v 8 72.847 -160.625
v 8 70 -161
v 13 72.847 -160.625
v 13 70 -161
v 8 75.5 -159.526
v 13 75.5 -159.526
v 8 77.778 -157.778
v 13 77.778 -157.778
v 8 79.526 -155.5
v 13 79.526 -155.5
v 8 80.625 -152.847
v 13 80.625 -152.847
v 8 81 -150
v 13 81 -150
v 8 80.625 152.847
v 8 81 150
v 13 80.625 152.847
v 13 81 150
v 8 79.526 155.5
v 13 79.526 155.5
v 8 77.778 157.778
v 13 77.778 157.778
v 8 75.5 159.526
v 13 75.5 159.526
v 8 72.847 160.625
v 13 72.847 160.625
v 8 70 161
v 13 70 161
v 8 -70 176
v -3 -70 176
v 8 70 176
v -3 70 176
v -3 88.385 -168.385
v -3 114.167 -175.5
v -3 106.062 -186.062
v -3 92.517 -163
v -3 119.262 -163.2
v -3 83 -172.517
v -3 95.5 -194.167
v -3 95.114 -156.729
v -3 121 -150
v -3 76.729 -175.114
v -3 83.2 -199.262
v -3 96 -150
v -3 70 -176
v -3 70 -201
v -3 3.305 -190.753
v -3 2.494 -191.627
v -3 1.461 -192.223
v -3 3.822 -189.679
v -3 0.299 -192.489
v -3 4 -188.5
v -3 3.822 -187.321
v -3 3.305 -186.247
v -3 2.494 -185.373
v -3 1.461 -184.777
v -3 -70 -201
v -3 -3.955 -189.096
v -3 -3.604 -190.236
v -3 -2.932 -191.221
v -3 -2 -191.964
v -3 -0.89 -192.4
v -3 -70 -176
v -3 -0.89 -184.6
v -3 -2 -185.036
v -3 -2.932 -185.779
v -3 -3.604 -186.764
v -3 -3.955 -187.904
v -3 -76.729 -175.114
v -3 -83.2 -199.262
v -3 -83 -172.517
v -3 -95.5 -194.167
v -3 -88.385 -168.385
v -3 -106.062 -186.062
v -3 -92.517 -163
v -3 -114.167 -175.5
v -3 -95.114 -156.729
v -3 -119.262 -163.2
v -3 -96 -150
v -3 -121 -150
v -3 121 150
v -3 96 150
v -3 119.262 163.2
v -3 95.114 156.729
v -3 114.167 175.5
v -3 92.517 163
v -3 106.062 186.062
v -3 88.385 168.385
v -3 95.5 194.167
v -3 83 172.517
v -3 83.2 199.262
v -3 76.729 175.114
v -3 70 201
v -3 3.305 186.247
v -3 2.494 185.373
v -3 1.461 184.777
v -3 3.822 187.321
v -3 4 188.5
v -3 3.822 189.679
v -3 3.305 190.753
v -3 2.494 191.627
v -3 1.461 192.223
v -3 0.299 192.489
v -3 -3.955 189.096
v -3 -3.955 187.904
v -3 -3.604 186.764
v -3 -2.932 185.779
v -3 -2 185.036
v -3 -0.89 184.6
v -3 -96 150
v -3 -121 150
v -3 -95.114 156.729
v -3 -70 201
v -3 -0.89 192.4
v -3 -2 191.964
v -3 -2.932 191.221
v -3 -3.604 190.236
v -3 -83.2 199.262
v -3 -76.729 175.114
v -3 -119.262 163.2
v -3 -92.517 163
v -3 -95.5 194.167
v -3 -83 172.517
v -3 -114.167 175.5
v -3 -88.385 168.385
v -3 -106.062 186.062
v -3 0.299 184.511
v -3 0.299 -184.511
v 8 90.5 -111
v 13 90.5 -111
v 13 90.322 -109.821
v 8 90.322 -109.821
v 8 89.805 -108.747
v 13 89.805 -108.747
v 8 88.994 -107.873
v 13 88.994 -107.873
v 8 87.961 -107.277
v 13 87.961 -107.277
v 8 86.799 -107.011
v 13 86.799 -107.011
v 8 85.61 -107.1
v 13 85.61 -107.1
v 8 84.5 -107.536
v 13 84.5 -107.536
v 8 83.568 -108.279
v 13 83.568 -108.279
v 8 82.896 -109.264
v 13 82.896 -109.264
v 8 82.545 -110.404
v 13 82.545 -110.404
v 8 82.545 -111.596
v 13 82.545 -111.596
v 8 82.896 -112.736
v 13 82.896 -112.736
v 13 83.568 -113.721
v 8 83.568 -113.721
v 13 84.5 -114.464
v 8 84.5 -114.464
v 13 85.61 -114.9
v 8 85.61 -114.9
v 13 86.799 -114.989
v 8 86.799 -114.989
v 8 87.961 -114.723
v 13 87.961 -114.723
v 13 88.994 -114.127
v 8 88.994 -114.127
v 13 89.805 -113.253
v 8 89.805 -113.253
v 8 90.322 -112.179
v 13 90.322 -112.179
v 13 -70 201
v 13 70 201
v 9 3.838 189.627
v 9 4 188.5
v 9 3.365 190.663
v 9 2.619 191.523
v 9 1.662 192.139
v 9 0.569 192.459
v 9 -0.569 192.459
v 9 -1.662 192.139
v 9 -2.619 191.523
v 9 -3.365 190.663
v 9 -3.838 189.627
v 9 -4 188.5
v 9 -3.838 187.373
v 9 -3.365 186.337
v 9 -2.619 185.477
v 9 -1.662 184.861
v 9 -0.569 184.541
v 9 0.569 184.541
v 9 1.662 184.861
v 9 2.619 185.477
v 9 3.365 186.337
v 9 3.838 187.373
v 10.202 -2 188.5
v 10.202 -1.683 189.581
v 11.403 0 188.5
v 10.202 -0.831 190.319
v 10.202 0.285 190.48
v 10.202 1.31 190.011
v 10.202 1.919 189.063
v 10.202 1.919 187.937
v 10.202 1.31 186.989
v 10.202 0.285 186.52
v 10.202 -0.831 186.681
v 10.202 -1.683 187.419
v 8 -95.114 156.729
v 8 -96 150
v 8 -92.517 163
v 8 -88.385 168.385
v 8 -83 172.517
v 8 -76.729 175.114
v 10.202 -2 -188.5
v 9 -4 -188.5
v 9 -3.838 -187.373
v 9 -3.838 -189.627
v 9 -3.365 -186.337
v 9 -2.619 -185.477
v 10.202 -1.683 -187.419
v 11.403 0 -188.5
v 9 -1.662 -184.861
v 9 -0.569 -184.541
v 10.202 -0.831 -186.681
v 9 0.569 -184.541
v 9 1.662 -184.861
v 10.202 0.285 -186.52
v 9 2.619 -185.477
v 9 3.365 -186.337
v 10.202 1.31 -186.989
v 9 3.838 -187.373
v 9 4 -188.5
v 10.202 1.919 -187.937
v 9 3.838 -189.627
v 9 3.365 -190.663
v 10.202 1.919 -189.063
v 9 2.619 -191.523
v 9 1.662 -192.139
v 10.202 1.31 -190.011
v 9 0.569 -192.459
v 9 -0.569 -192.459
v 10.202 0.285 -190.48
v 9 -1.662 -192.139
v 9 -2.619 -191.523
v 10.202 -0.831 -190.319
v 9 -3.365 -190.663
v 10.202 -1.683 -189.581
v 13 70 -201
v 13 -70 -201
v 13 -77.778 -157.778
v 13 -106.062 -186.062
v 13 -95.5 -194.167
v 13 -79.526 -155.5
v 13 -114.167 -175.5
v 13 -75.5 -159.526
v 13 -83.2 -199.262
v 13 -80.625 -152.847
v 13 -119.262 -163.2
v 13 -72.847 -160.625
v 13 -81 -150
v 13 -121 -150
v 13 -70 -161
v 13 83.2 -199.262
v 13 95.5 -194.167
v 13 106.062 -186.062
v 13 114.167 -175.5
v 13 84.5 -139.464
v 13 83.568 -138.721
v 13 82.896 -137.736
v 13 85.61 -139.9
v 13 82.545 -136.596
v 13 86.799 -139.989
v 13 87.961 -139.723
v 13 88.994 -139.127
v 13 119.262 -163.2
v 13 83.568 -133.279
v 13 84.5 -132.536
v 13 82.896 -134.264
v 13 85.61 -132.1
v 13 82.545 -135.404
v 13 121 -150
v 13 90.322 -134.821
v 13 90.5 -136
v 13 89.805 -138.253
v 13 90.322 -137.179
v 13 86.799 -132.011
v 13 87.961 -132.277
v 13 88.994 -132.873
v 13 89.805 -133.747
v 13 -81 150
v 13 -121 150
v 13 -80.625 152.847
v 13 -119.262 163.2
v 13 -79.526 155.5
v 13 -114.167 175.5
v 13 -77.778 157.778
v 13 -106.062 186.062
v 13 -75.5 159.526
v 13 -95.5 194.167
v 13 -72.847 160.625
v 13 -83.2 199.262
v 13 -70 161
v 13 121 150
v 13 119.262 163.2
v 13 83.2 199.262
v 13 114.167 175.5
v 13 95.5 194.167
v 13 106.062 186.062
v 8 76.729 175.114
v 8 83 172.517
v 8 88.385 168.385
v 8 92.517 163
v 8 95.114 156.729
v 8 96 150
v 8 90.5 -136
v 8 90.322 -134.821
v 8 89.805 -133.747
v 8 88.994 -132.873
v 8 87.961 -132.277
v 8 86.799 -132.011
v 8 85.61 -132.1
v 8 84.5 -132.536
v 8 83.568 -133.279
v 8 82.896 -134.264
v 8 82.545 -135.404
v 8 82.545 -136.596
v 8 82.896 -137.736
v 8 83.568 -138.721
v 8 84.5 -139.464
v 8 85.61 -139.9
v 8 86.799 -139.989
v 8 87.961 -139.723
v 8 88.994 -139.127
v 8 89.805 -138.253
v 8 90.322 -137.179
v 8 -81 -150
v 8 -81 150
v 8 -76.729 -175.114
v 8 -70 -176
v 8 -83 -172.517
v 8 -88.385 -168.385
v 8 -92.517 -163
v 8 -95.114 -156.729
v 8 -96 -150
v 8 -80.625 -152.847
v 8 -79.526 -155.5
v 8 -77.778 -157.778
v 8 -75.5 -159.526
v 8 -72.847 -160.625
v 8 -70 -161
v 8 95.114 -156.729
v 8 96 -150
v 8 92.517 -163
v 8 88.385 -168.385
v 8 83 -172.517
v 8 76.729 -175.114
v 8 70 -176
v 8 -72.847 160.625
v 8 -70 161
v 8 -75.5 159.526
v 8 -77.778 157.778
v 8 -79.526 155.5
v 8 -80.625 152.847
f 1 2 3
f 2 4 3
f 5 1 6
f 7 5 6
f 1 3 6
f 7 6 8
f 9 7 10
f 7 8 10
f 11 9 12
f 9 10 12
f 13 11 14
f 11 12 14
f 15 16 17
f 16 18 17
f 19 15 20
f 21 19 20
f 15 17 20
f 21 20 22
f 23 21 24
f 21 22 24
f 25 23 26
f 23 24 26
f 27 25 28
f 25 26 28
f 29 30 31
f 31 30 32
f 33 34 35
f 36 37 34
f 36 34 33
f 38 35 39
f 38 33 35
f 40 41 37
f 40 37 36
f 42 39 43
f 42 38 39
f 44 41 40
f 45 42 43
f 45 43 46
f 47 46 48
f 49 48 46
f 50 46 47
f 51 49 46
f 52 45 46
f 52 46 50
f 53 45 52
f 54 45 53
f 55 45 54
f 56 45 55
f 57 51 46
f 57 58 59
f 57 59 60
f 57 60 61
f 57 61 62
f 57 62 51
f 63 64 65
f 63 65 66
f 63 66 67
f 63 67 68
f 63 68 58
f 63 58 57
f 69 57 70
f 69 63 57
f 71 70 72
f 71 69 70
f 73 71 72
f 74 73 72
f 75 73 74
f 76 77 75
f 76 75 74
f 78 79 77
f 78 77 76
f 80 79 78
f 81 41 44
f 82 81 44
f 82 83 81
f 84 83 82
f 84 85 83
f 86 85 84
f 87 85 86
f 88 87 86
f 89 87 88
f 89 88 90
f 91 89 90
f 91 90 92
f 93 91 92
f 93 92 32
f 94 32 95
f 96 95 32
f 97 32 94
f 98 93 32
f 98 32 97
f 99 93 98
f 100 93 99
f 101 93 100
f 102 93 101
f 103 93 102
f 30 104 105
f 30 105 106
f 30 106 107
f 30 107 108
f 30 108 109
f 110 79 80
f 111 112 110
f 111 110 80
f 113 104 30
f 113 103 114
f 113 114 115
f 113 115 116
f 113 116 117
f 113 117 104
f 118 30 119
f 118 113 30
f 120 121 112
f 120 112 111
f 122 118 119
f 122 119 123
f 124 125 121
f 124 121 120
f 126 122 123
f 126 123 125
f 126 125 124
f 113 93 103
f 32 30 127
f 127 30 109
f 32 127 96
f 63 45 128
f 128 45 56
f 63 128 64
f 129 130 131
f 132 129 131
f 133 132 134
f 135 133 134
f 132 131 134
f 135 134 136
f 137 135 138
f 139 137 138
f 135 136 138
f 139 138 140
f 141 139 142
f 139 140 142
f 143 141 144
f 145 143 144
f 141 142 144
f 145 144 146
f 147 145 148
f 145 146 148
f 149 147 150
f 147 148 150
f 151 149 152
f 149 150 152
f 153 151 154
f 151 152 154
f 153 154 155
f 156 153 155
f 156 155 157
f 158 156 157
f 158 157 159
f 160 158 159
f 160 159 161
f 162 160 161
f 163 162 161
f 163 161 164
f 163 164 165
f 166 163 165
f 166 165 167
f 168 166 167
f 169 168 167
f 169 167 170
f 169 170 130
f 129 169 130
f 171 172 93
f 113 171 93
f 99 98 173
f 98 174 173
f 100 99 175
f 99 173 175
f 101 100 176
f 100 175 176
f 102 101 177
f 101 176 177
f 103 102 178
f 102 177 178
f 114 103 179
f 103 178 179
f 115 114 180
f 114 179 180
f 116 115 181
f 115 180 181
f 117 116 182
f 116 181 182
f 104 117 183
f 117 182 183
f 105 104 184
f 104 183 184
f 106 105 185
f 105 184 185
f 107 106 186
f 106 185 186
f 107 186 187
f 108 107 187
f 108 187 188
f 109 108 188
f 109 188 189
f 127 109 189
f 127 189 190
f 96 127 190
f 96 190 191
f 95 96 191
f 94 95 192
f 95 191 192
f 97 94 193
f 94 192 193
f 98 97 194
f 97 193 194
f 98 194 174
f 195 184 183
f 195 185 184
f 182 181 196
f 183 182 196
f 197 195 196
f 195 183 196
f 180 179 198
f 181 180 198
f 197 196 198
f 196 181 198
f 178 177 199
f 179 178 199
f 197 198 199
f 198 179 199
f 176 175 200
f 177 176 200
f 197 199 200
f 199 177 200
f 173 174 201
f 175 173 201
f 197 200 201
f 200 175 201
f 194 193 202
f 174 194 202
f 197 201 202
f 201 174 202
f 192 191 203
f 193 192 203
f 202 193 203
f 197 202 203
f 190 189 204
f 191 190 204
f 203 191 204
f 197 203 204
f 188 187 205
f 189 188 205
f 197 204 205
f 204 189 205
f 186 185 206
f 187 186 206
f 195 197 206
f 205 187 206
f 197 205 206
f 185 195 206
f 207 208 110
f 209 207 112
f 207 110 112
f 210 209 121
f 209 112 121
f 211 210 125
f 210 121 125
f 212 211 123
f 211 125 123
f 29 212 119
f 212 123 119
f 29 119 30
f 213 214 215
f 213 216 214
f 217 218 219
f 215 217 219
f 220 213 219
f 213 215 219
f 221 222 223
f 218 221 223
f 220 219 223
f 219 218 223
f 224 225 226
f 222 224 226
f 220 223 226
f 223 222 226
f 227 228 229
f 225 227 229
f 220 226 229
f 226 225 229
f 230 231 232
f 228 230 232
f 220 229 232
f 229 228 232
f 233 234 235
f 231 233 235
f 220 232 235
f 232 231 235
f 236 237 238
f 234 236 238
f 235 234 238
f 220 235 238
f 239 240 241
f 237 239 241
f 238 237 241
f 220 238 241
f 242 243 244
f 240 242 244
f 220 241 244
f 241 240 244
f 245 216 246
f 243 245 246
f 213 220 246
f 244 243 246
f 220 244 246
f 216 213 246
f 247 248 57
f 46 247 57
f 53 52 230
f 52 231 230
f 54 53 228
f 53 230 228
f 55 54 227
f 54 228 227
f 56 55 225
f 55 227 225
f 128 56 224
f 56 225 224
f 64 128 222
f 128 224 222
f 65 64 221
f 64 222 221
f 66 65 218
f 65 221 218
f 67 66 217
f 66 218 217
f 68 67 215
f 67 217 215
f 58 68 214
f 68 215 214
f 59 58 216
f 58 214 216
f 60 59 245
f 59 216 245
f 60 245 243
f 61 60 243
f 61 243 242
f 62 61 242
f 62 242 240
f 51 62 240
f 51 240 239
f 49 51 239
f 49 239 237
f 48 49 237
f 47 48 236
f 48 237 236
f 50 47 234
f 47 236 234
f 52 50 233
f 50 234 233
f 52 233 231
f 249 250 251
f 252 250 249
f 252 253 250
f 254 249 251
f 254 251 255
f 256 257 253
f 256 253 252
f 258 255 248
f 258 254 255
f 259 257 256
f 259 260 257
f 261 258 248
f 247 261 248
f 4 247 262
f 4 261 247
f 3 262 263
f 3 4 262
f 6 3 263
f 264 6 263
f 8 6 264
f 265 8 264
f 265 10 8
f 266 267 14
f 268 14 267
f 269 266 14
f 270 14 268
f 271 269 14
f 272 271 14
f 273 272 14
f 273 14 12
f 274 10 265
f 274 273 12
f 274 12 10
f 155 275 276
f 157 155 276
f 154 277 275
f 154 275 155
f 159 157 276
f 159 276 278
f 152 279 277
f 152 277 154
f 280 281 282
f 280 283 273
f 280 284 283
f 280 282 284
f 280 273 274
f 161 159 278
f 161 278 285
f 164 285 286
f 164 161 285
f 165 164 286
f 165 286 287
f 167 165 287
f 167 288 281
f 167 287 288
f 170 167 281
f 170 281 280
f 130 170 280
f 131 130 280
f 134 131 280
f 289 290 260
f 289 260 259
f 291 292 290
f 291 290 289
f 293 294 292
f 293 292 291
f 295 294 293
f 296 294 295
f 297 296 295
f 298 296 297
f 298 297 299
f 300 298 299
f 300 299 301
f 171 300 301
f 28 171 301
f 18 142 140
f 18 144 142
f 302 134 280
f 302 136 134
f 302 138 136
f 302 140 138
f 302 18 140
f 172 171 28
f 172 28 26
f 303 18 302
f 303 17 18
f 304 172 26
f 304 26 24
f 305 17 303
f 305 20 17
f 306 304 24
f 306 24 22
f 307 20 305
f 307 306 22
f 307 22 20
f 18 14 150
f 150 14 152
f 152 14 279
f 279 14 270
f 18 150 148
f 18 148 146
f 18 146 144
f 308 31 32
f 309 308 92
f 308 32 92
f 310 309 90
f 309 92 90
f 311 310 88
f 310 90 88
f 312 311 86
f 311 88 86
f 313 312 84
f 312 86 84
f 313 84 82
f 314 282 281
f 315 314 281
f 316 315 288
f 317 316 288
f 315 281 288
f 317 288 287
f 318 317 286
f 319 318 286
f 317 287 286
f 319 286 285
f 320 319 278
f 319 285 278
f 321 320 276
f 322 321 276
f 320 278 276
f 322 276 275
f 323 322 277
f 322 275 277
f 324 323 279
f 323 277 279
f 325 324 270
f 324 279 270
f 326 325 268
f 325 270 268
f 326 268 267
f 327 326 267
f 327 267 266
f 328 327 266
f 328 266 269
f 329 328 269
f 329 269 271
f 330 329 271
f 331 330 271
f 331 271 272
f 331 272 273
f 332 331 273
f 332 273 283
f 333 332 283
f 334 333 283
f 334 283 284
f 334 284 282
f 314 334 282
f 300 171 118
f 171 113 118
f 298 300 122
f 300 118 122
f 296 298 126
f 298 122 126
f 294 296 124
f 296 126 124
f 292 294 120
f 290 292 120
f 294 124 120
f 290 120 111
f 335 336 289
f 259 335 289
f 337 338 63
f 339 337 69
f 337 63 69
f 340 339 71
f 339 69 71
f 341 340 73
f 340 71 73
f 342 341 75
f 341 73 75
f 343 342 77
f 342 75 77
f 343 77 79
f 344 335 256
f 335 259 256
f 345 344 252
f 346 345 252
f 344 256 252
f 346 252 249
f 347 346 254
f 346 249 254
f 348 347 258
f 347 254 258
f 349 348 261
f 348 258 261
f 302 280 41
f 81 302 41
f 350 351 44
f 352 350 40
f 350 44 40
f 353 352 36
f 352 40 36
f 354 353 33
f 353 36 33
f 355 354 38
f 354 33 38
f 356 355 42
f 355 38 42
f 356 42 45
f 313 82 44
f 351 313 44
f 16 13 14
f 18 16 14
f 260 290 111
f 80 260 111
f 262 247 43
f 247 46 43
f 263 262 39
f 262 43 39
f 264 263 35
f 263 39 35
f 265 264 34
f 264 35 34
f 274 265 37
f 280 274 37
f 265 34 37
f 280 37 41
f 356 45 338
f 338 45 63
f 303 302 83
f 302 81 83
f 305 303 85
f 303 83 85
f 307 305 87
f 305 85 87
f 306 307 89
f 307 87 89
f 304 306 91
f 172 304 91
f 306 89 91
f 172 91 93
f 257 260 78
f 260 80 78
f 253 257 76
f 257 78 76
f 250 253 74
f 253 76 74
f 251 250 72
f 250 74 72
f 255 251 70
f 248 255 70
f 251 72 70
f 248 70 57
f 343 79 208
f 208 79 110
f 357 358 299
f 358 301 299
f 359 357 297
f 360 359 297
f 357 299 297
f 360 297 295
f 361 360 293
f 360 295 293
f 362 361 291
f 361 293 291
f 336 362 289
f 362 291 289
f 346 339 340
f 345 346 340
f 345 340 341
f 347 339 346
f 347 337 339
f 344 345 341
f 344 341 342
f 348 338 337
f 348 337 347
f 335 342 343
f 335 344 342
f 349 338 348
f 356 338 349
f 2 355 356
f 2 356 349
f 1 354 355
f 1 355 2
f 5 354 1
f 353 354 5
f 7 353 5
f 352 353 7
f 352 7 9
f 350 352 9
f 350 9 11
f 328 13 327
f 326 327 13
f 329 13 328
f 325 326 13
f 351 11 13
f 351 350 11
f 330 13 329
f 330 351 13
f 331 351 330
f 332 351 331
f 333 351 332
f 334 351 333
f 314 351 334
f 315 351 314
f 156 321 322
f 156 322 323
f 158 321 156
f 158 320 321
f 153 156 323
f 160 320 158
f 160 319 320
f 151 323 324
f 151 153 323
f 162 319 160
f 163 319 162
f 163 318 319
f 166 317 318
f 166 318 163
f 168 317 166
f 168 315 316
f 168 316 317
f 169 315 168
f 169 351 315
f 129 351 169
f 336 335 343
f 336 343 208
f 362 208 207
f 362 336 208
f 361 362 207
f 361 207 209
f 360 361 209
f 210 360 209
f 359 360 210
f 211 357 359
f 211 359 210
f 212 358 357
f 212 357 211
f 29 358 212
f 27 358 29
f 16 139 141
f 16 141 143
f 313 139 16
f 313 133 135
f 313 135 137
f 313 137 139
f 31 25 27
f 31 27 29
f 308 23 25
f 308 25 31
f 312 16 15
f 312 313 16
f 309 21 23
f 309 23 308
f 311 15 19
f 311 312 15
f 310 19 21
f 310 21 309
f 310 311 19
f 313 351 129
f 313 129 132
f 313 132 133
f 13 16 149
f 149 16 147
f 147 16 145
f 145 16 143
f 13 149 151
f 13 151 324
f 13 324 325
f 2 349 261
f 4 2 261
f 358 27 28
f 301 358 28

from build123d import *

# Parameters (mm, degrees)
BOSS_EXTRUDE1_DEPTH       = 16
CUT_EXTRUDE3_DEPTH        = 11
SKETCH3_R                 = 4
CUT_EXTRUDE1_DEPTH        = 236.155267855
F_8_0MM_DOWEL_HOLE1_D     = 8
F_8_0MM_DOWEL_HOLE1_DEPTH = 12
F_8_0MM_DOWEL_HOLE1_TIP   = 2.403442476


with BuildPart() as part:
    # Sweep1: sweep along a path in Sketch2
    with BuildLine(Plane(origin=(0, 0, 0), x_dir=(0, 0, -1), z_dir=(1, 0, 0))) as sweep1_path:
        Line((150, 92), (-150, 92))
        ThreePointArc((-150, 92), (-165.556349186, 85.556349186), (-172, 70))
        Line((-172, 70), (-172, -70))
        ThreePointArc((-172, -70), (-165.556349186, -85.556349186), (-150, -92))
        Line((-150, -92), (150, -92))
        ThreePointArc((150, -92), (165.556349186, -85.556349186), (172, -70))
        Line((172, -70), (172, 70))
        ThreePointArc((172, 70), (165.556349186, 85.556349186), (150, 92))
    # Sketch1 → Sweep1 (sweep)
    with BuildSketch(Plane.XY):
        Polygon((-3, 96), (-3, 121), (13, 121), (13, 81), (8, 81), (8, 96), align=None)
    sweep(path=sweep1_path.line)

    # Sketch5 → Boss-Extrude1 (add)
    with BuildSketch(Plane(origin=(13, 0, 0), x_dir=(0, 0, -1), z_dir=(1, 0, 0))):
        with BuildLine():
            Line((201, 70), (201, -70))
            ThreePointArc((201, -70), (186.062445841, -106.062445841), (150, -121))
            Line((150, -121), (-150, -121))
            ThreePointArc((-150, -121), (-186.062445841, -106.062445841), (-201, -70))
            Line((-201, -70), (-201, 70))
            ThreePointArc((-201, 70), (-186.062445841, 106.062445841), (-150, 121))
            Line((-150, 121), (150, 121))
            ThreePointArc((150, 121), (186.062445841, 106.062445841), (201, 70))
        make_face()
        with BuildLine():
            Line((-161, -70), (-161, 70))
            ThreePointArc((-161, 70), (-157.778174593, 77.778174593), (-150, 81))
            Line((-150, 81), (150, 81))
            ThreePointArc((150, 81), (157.778174593, 77.778174593), (161, 70))
            Line((161, 70), (161, -70))
            ThreePointArc((161, -70), (157.778174593, -77.778174593), (150, -81))
            Line((150, -81), (-150, -81))
            ThreePointArc((-150, -81), (-157.778174593, -77.778174593), (-161, -70))
        make_face(mode=Mode.SUBTRACT)
    extrude(amount=-BOSS_EXTRUDE1_DEPTH)

    # Sketch6 → Cut-Extrude3 (cut)
    with BuildSketch(Plane.ZY.offset(3)):
        with BuildLine():
            Line((176, -70), (176, 70))
            ThreePointArc((176, 70), (168.384776311, 88.384776311), (150, 96))
            Line((150, 96), (-150, 96))
            ThreePointArc((-150, 96), (-168.384776311, 88.384776311), (-176, 70))
            Line((-176, 70), (-176, -70))
            ThreePointArc((-176, -70), (-168.384776311, -88.384776311), (-150, -96))
            Line((-150, -96), (150, -96))
            ThreePointArc((150, -96), (168.384776311, -88.384776311), (176, -70))
        make_face()
    extrude(amount=-CUT_EXTRUDE3_DEPTH, mode=Mode.SUBTRACT)

    # Sketch3 → Cut-Extrude1 (cut, through all)
    with BuildSketch(Plane(origin=(13, 0, 0), x_dir=(0, 0, -1), z_dir=(1, 0, 0))):
        with Locations(Location((111, 86.5, 0), (0, 0, 90))):
            Circle(SKETCH3_R)
        with Locations(Location((136, 86.5, 0), (0, 0, 90))):
            Circle(SKETCH3_R)
    extrude(amount=-CUT_EXTRUDE1_DEPTH, mode=Mode.SUBTRACT)

    # Ø8.0mm Dowel Hole1
    with Locations(Plane(origin=(-3, 0, -188.5), x_dir=(0, -1, 0), z_dir=(-1, 0, 0))):
        with Locations((0, 0), (0, 377)):
            Hole(F_8_0MM_DOWEL_HOLE1_D / 2, depth=F_8_0MM_DOWEL_HOLE1_DEPTH)
            with Locations((0, 0, -(F_8_0MM_DOWEL_HOLE1_DEPTH + F_8_0MM_DOWEL_HOLE1_TIP / 2))):  # 118° drill point
                Cone(0, F_8_0MM_DOWEL_HOLE1_D / 2, F_8_0MM_DOWEL_HOLE1_TIP, mode=Mode.SUBTRACT)


solid = part.part
